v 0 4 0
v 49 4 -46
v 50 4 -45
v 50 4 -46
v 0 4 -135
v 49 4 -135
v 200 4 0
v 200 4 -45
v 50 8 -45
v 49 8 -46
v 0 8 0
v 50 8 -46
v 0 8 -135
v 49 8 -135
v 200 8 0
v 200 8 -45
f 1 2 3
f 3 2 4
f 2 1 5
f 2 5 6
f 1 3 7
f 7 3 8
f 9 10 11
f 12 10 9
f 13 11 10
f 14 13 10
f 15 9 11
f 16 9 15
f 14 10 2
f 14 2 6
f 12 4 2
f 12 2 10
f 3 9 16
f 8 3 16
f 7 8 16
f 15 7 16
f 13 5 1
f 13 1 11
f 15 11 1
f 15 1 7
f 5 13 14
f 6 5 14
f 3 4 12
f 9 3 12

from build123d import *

# Parameters (mm, degrees)
STOCK_2D1LAYER_1_START       = -45
STOCK_2D1LAYER_1_OUTLINE_W   = 200
STOCK_2D1LAYER_1_OUTLINE_H   = 4
STOCK_2D1LAYER_1_DEPTH       = 45
STOCK_2D1LAYER_1_START_2     = -135
STOCK_2D1LAYER_1_2_OUTLINE_W = 50
STOCK_2D1LAYER_1_2_OUTLINE_H = 4
STOCK_2D1LAYER_1_2_DEPTH     = 90
SKETCH1_W                    = 89
SKETCH1_H                    = 4
CUT_EXTRUDE1_DEPTH           = 1


# Read off the part's stored shape, not the designer's step: Stock-2D1Layer-1
with BuildPart() as part:
    # Stock-2D1Layer-1 outline → Stock-2D1Layer-1 (new body)
    with BuildSketch(Plane.XY.offset(STOCK_2D1LAYER_1_START)):
        with Locations((100, 6)):
            Rectangle(STOCK_2D1LAYER_1_OUTLINE_W, STOCK_2D1LAYER_1_OUTLINE_H)
    extrude(amount=STOCK_2D1LAYER_1_DEPTH)

    # Stock-2D1Layer-1 2 outline → Stock-2D1Layer-1 2 (add)
    with BuildSketch(Plane.XY.offset(STOCK_2D1LAYER_1_START_2)):
        with Locations((25, 6)):
            Rectangle(STOCK_2D1LAYER_1_2_OUTLINE_W, STOCK_2D1LAYER_1_2_OUTLINE_H)
    extrude(amount=STOCK_2D1LAYER_1_2_DEPTH)

    # Sketch1 → Cut-Extrude1 (cut)
    with BuildSketch(Plane(origin=(50, 0, 0), x_dir=(0, 0, -1), z_dir=(1, 0, 0))):
        with Locations((90.5, 6)):
            Rectangle(SKETCH1_W, SKETCH1_H)
    extrude(amount=-CUT_EXTRUDE1_DEPTH, mode=Mode.SUBTRACT)


solid = part.part
